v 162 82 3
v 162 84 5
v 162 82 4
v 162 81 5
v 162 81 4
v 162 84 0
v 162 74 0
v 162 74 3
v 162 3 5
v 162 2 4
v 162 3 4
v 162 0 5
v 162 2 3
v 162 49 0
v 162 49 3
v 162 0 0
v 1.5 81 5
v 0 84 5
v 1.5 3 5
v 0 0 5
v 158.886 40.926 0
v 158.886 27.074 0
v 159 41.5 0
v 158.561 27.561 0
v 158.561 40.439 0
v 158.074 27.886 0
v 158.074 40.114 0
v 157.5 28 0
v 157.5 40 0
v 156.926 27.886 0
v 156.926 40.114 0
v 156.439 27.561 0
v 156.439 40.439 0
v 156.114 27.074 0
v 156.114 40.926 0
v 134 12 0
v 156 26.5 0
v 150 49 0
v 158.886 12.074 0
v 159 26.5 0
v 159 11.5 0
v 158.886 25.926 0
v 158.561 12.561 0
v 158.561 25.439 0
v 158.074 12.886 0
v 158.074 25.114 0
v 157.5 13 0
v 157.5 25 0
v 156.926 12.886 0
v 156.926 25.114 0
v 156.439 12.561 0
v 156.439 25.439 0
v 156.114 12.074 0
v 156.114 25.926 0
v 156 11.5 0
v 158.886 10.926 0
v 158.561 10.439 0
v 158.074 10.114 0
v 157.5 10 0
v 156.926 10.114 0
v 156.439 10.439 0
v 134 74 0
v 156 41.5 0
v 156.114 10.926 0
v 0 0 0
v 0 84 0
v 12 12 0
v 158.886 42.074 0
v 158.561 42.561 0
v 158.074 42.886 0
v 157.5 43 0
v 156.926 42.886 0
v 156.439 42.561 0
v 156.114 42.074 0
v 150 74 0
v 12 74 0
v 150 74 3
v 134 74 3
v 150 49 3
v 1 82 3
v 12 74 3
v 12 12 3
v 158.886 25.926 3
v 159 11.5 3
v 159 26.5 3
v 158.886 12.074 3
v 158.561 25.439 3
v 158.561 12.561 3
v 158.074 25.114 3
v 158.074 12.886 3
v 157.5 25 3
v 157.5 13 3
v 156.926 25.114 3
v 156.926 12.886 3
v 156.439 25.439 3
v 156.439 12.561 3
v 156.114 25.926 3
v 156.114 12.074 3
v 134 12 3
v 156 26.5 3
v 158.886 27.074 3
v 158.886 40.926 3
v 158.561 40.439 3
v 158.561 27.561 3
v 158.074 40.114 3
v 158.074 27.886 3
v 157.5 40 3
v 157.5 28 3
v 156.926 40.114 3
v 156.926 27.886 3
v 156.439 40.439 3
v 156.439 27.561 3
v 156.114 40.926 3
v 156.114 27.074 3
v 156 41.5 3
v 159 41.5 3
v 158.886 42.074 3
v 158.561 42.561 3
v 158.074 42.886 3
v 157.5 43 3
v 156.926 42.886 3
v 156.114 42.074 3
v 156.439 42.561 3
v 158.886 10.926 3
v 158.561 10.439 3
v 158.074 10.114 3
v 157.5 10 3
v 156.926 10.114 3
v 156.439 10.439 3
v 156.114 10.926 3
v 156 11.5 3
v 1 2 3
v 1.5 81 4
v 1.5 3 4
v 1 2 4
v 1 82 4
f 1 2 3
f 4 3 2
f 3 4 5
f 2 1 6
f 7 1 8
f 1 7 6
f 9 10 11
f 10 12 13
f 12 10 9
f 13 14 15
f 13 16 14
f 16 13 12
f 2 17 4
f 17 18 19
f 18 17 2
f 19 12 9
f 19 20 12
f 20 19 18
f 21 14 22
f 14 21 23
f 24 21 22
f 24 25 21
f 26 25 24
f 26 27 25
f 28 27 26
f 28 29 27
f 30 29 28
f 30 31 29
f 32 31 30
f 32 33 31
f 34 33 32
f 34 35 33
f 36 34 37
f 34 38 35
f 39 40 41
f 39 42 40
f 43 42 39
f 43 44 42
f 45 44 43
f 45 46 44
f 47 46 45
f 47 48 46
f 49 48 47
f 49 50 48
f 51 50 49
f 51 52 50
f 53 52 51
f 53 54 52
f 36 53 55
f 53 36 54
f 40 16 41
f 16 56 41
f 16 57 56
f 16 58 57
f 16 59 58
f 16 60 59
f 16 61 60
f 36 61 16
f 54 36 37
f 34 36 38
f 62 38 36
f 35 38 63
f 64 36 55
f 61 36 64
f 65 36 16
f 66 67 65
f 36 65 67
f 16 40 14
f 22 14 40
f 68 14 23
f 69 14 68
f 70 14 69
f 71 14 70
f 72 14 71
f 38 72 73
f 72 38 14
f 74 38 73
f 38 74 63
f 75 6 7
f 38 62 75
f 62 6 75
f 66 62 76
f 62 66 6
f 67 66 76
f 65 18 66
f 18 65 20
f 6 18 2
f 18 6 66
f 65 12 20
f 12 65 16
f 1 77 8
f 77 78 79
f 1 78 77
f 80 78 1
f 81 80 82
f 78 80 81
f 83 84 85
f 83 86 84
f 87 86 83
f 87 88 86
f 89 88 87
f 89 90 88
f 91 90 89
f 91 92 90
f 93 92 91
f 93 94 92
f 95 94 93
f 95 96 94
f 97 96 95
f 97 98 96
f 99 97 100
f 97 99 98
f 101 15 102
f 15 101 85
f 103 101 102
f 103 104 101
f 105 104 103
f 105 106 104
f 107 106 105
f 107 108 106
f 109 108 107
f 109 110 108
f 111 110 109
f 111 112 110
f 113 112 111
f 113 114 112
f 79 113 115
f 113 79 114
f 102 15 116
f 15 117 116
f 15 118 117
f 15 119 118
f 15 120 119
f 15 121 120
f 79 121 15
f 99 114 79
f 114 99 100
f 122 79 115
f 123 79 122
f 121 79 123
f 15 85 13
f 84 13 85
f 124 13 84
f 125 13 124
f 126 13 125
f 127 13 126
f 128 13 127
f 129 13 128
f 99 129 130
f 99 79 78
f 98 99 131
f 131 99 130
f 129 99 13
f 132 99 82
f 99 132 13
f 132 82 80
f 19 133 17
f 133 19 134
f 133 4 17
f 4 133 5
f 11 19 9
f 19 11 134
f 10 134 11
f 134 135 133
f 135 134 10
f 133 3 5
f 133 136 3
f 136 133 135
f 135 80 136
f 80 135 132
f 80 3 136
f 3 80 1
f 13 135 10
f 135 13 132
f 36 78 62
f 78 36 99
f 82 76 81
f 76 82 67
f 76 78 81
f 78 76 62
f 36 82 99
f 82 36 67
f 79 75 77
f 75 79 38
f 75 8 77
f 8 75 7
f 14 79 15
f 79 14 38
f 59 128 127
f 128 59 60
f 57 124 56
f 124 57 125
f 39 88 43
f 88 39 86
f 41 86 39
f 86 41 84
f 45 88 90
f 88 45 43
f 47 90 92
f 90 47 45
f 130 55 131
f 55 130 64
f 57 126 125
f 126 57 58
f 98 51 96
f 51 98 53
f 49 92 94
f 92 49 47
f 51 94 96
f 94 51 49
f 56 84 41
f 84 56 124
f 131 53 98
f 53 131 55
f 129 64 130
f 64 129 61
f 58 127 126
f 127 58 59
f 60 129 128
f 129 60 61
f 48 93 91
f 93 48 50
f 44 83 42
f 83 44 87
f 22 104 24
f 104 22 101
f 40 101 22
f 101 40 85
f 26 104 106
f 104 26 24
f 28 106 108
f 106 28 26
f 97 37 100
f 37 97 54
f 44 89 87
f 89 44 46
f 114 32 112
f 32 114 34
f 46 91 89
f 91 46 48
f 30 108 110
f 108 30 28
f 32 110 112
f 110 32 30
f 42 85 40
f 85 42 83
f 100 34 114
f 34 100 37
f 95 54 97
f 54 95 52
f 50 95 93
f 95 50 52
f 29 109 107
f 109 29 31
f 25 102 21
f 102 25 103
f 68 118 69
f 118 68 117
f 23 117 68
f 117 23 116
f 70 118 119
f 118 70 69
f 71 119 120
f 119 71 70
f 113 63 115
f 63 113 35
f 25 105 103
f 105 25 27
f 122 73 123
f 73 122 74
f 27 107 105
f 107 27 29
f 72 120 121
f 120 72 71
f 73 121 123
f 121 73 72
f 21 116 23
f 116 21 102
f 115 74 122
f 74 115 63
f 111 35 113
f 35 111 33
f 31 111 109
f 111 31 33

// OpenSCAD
// MIT License
//
// Copyright (c) 2022 David Lawson
//
// Permission is hereby granted, free of charge, to any person obtaining a copy
// of this software and associated documentation files (the "Software"), to deal
// in the Software without restriction, including without limitation the rights
// to use, copy, modify, merge, publish, distribute, sublicense, and/or sell
// copies of the Software, and to permit persons to whom the Software is
// furnished to do so, subject to the following conditions:
//
// The above copyright notice and this permission notice shall be included in all
// copies or substantial portions of the Software.
//
// THE SOFTWARE IS PROVIDED "AS IS", WITHOUT WARRANTY OF ANY KIND, EXPRESS OR
// IMPLIED, INCLUDING BUT NOT LIMITED TO THE WARRANTIES OF MERCHANTABILITY,
// FITNESS FOR A PARTICULAR PURPOSE AND NONINFRINGEMENT. IN NO EVENT SHALL THE
// AUTHORS OR COPYRIGHT HOLDERS BE LIABLE FOR ANY CLAIM, DAMAGES OR OTHER
// LIABILITY, WHETHER IN AN ACTION OF CONTRACT, TORT OR OTHERWISE, ARISING FROM,
// OUT OF OR IN CONNECTION WITH THE SOFTWARE OR THE USE OR OTHER DEALINGS IN THE
// SOFTWARE.
difference() {
    translate([81,42,2.5])
    cube([162,84,5], center=true);
    
    translate([3,3,3])
    translate([79,39,1.5]) cube([161,78,3], center=true);
    
    translate([2,2,3])
    translate([80,40,.5]) cube([162,80,1], center=true);
    
    translate([12,12,-.5])
    translate([61,31,2.5]) cube([122,62,5], center=true);

    translate([150,49,-.5])
    translate([7.5,12.5,2.5]) cube([15,25,5], center=true);
    
    $fn=16;
    translate([156, 10, 0])
        translate([1.5,1.5,-1]) cylinder(r=1.5,h=10);
    translate([156, 10, 0])
        translate([0,15,0])
        translate([1.5,1.5,-1]) cylinder(r=1.5,h=10);
    translate([156, 10, 0])
        translate([0,30,0])
        translate([1.5,1.5,-1]) cylinder(r=1.5,h=10);      
 }
